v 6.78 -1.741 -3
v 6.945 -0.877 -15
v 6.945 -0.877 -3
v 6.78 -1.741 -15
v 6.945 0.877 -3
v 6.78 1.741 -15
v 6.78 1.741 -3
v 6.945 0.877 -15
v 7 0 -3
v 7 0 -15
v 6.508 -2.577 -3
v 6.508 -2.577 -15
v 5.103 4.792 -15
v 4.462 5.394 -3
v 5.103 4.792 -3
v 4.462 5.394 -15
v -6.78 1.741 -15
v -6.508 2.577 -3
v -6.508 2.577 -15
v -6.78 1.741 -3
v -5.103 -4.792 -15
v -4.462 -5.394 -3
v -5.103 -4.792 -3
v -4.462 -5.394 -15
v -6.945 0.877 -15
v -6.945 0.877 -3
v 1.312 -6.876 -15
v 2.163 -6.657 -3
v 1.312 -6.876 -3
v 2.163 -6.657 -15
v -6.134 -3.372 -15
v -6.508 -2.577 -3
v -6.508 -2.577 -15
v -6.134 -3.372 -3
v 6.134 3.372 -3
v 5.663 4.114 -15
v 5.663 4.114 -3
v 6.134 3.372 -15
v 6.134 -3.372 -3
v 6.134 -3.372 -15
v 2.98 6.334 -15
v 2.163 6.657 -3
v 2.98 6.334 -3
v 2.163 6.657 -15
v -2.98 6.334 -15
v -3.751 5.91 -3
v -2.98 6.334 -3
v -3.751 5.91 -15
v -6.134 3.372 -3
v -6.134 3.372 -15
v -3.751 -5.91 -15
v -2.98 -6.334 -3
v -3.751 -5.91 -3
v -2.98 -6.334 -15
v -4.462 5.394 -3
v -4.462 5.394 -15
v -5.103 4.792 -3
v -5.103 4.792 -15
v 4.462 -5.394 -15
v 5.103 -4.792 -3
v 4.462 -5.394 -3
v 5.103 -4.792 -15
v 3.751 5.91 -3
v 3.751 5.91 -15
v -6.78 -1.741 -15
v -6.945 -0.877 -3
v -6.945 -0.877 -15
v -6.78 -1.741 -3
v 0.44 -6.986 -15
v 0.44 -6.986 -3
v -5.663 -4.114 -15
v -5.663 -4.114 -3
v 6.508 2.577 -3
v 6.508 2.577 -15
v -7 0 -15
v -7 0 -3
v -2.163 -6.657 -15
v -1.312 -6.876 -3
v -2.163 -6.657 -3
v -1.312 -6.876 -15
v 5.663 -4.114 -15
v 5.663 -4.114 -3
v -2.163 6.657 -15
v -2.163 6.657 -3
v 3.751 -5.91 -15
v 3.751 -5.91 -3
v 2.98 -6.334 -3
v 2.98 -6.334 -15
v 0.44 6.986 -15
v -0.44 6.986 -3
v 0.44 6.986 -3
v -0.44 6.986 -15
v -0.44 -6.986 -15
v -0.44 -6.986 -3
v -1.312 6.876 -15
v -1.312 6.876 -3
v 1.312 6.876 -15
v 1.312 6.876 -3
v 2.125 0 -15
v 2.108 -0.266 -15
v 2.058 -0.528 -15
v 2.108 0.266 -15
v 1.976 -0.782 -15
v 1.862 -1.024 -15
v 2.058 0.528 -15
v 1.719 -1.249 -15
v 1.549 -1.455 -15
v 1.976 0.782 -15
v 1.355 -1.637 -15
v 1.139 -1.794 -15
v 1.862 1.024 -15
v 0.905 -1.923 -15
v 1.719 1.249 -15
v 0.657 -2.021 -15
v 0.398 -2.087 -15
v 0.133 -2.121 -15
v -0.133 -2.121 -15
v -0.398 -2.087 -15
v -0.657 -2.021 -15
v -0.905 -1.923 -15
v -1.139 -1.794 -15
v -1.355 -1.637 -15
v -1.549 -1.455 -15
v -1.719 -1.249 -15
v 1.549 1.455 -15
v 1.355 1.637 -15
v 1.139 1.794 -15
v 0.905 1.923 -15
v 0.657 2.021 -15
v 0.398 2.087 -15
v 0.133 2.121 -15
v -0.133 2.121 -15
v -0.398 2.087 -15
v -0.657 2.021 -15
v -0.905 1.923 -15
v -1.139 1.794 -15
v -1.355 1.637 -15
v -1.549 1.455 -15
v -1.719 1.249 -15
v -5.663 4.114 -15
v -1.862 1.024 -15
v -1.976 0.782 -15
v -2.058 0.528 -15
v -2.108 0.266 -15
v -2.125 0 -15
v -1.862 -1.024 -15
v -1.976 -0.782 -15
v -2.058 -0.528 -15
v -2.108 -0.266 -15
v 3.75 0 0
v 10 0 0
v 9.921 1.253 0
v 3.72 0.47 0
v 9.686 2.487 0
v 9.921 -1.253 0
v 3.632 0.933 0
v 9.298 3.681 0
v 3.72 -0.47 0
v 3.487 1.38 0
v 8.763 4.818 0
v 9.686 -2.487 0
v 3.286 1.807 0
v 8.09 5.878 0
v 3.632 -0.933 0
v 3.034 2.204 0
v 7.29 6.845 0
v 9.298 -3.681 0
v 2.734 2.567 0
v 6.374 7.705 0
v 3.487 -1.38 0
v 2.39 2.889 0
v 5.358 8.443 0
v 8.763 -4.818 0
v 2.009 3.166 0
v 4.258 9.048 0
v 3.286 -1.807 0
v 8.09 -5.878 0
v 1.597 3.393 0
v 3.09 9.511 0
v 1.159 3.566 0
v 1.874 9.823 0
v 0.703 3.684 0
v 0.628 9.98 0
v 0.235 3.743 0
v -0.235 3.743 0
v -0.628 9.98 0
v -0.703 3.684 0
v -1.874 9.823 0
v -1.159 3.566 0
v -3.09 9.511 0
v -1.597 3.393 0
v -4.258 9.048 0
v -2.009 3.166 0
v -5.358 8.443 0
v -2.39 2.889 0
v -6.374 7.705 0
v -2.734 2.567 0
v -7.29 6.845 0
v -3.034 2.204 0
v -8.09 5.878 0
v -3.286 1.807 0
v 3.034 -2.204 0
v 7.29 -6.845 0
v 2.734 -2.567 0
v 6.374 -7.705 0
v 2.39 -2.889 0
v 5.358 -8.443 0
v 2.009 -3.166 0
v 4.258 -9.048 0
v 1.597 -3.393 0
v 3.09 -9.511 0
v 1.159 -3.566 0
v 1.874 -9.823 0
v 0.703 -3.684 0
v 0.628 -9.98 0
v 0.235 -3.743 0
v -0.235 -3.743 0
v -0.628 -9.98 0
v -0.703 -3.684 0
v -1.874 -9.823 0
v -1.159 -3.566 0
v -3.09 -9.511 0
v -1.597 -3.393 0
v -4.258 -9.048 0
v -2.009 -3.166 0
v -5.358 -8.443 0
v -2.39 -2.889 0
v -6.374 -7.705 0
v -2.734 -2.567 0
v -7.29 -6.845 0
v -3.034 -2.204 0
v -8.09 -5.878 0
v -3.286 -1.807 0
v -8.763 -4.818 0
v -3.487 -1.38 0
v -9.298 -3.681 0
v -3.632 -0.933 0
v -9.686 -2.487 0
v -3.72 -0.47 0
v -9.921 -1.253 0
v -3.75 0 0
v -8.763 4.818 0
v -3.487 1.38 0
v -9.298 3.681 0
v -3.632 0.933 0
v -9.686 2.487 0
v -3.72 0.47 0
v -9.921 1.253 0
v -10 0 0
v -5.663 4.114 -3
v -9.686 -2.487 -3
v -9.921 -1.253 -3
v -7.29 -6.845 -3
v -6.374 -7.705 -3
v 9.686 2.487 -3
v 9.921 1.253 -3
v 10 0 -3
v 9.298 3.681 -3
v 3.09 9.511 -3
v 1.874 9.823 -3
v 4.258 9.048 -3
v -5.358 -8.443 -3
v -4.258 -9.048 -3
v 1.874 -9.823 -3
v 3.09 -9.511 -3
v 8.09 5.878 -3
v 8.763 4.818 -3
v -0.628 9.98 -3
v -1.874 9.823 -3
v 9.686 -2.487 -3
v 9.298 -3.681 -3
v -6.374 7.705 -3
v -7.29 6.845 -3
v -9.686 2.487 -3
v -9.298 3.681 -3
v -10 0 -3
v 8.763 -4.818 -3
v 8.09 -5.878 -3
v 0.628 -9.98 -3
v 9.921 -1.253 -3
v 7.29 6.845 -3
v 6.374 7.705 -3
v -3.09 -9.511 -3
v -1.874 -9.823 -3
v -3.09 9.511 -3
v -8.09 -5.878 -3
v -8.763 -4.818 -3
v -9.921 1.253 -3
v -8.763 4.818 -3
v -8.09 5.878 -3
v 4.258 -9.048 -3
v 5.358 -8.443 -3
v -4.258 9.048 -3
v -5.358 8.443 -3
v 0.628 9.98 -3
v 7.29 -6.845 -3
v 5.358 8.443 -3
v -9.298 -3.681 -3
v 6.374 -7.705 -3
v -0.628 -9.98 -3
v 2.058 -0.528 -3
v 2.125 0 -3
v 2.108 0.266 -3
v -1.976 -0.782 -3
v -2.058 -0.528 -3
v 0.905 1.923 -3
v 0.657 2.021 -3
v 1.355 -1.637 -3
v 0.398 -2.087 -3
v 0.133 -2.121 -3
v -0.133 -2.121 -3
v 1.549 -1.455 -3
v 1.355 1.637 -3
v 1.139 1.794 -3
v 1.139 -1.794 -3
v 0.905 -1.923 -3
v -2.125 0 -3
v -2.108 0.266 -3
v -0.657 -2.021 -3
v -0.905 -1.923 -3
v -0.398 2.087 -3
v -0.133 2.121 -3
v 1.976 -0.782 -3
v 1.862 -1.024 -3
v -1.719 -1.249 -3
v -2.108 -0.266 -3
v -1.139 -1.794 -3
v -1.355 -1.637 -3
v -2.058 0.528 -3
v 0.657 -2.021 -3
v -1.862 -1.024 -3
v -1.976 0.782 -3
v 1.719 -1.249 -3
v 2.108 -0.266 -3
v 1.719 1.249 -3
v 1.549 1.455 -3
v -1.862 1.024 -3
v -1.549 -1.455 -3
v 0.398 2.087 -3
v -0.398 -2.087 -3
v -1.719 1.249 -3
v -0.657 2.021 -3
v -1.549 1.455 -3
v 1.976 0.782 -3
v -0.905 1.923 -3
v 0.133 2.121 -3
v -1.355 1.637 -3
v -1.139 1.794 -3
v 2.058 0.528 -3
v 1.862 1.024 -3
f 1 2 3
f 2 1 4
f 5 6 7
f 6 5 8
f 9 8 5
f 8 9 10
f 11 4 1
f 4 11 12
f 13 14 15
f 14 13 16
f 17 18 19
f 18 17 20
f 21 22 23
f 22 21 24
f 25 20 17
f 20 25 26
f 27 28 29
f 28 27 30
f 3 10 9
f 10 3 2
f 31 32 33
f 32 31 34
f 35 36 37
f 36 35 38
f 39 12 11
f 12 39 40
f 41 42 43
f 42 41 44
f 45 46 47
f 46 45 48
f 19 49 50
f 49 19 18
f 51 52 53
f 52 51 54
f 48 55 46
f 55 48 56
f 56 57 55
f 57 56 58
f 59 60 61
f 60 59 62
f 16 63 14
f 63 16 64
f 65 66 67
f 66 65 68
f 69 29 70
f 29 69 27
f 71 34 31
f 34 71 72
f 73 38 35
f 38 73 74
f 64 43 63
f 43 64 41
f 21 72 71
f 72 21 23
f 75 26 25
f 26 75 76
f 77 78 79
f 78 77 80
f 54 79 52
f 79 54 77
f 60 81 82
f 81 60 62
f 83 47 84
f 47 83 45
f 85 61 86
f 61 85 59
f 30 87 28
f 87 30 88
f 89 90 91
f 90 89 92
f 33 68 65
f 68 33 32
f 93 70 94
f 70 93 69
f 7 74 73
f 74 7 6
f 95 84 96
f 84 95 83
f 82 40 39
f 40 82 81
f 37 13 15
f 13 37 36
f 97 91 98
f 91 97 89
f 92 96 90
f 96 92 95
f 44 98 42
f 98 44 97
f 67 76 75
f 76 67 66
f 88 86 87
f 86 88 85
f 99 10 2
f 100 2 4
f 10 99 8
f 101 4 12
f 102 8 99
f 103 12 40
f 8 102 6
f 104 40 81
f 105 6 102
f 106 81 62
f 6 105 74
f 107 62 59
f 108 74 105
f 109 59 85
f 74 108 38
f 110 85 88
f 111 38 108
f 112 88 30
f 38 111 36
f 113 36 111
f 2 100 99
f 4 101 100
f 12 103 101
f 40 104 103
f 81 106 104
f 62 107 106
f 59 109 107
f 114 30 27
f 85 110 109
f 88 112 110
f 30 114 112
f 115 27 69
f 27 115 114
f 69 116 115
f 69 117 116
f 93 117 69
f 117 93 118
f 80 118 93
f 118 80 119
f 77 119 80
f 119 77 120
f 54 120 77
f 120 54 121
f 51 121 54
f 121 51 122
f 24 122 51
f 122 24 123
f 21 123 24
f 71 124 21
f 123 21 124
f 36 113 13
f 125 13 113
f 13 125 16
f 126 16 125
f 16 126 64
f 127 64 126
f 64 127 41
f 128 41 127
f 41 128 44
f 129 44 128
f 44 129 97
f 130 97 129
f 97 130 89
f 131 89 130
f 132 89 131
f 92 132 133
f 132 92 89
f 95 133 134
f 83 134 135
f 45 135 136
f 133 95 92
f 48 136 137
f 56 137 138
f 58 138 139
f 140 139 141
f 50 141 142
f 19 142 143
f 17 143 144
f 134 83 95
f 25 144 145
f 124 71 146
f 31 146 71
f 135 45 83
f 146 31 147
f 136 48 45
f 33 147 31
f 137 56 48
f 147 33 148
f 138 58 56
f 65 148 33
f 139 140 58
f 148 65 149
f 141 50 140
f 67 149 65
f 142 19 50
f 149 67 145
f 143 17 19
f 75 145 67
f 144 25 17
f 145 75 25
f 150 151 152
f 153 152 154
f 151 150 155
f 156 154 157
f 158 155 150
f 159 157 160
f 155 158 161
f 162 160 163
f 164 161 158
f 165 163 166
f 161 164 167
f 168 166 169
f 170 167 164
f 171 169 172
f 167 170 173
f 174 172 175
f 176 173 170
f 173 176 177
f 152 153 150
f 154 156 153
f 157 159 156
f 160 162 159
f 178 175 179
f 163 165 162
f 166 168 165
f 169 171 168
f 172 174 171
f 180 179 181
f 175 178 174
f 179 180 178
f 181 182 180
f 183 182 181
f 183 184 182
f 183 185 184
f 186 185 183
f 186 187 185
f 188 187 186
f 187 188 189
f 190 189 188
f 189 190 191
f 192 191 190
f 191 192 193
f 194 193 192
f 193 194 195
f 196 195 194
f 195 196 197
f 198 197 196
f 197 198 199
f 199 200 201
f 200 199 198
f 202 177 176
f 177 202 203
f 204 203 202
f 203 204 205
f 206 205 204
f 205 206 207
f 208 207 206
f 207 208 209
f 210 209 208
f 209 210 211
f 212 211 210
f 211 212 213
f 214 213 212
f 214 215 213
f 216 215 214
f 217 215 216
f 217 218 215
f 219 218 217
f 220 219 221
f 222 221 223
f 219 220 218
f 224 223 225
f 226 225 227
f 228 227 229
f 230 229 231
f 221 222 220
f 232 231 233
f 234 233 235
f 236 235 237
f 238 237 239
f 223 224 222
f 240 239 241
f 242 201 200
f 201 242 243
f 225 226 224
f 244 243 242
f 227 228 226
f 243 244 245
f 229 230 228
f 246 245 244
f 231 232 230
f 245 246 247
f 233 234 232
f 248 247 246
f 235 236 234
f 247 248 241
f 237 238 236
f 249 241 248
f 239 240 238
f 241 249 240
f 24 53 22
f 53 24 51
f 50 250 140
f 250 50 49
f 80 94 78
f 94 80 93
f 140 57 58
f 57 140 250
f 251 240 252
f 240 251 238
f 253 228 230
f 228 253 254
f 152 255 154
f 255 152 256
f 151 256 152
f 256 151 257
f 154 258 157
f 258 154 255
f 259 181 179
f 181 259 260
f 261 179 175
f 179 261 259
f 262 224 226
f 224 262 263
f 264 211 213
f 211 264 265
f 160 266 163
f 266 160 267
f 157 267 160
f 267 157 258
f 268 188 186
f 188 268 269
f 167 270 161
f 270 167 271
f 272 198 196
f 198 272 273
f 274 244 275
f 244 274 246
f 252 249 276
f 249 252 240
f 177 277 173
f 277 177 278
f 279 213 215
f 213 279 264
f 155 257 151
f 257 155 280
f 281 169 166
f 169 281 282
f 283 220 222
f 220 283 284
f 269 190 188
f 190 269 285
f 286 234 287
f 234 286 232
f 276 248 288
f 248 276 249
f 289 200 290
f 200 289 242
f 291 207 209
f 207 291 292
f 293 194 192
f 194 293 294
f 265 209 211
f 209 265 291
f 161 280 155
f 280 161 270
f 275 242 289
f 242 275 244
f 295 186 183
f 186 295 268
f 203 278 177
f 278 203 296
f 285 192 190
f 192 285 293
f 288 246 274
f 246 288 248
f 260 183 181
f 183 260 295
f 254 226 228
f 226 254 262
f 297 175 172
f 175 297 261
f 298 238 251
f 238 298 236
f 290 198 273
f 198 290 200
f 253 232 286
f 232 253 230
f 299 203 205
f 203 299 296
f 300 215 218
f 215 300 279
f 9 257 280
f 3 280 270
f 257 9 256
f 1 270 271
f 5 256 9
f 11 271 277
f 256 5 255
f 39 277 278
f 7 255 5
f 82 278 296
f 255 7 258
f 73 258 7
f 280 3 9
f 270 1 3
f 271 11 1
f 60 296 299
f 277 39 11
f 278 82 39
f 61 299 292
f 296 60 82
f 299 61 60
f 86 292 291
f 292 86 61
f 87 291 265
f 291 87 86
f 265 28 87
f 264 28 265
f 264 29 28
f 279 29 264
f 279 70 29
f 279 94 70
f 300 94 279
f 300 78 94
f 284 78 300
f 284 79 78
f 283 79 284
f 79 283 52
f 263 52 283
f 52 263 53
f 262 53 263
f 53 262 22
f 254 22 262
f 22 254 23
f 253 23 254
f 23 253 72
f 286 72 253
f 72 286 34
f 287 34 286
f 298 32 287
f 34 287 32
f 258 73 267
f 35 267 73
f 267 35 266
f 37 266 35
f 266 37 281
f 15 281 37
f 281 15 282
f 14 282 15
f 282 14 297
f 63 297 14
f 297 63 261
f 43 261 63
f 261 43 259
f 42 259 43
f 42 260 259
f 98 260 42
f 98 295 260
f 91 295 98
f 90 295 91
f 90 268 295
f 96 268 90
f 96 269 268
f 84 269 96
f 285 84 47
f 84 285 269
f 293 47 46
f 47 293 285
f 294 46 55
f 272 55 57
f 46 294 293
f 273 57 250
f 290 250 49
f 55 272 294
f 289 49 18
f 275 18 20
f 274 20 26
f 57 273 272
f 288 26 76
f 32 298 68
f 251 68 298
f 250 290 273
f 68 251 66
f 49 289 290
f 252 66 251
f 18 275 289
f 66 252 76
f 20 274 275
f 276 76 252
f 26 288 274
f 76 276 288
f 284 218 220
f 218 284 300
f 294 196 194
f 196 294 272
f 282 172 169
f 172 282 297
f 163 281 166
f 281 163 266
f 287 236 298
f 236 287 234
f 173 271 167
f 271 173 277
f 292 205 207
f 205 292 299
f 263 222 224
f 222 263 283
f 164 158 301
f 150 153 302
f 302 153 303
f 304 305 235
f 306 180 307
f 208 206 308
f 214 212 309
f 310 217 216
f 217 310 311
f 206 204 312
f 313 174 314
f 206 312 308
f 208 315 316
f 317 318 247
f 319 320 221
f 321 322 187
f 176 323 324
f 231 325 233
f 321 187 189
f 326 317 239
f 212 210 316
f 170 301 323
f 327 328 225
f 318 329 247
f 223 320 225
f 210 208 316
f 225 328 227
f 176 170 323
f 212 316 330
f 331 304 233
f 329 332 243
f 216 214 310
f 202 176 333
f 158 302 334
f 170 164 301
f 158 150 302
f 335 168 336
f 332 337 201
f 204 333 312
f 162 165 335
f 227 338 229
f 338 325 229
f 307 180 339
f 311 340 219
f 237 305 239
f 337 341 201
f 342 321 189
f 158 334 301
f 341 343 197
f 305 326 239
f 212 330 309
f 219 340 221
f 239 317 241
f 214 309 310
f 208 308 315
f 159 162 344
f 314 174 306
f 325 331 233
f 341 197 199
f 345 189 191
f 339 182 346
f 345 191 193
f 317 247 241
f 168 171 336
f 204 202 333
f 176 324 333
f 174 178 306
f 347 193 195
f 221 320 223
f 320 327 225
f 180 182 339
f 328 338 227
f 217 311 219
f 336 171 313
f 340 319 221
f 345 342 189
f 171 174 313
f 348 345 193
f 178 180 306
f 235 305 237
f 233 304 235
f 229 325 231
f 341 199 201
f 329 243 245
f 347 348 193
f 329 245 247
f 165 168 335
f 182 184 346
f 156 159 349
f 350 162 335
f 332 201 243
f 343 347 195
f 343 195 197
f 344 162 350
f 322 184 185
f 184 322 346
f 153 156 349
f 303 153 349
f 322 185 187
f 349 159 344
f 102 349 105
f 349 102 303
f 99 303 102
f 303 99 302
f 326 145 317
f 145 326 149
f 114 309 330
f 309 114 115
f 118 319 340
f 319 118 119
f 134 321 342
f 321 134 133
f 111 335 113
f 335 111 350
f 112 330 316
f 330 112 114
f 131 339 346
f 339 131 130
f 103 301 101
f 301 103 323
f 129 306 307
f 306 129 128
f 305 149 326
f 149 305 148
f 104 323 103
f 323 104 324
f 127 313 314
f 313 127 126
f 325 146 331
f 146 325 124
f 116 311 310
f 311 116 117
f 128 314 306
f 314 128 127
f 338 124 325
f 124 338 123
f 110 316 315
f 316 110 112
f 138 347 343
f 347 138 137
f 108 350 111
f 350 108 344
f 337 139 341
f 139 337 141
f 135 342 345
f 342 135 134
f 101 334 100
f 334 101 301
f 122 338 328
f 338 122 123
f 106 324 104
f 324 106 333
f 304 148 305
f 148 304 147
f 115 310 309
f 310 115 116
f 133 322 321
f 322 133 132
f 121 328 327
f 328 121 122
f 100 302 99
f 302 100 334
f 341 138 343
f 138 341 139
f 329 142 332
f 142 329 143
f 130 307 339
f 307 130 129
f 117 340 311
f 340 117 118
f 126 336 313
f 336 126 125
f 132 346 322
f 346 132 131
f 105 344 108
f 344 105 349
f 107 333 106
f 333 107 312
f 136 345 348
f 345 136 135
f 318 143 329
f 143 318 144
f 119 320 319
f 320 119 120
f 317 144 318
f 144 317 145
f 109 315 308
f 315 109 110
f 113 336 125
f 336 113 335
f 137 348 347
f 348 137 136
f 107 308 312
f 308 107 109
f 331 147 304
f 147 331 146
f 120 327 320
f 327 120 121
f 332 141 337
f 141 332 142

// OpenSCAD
$fn = 50;


difference() {
	union() {
		translate(v = [0, 0, -15.0000000000]) {
			cylinder(h = 15, r = 7.0000000000);
		}
		translate(v = [0, 0, -3.0000000000]) {
			cylinder(h = 3, r = 10.0000000000);
		}
	}
	union() {
		translate(v = [0, 0, 0]) {
			rotate(a = [0, 0, 0]) {
				difference() {
					union() {
						#translate(v = [0, 0, -15.0000000000]) {
							cylinder(h = 15, r = 2.0000000000);
						}
						#translate(v = [0, 0, -3]) {
							cylinder(h = 3, r = 7.0000000000, r1 = 2.1250000000, r2 = 3.7500000000);
						}
						#translate(v = [0, 0, -15.0000000000]) {
							cylinder(h = 15, r = 2.1250000000);
						}
						#translate(v = [0, 0, -15.0000000000]) {
							cylinder(h = 15, r = 2.0000000000);
						}
					}
					union();
				}
			}
		}
	}
}
